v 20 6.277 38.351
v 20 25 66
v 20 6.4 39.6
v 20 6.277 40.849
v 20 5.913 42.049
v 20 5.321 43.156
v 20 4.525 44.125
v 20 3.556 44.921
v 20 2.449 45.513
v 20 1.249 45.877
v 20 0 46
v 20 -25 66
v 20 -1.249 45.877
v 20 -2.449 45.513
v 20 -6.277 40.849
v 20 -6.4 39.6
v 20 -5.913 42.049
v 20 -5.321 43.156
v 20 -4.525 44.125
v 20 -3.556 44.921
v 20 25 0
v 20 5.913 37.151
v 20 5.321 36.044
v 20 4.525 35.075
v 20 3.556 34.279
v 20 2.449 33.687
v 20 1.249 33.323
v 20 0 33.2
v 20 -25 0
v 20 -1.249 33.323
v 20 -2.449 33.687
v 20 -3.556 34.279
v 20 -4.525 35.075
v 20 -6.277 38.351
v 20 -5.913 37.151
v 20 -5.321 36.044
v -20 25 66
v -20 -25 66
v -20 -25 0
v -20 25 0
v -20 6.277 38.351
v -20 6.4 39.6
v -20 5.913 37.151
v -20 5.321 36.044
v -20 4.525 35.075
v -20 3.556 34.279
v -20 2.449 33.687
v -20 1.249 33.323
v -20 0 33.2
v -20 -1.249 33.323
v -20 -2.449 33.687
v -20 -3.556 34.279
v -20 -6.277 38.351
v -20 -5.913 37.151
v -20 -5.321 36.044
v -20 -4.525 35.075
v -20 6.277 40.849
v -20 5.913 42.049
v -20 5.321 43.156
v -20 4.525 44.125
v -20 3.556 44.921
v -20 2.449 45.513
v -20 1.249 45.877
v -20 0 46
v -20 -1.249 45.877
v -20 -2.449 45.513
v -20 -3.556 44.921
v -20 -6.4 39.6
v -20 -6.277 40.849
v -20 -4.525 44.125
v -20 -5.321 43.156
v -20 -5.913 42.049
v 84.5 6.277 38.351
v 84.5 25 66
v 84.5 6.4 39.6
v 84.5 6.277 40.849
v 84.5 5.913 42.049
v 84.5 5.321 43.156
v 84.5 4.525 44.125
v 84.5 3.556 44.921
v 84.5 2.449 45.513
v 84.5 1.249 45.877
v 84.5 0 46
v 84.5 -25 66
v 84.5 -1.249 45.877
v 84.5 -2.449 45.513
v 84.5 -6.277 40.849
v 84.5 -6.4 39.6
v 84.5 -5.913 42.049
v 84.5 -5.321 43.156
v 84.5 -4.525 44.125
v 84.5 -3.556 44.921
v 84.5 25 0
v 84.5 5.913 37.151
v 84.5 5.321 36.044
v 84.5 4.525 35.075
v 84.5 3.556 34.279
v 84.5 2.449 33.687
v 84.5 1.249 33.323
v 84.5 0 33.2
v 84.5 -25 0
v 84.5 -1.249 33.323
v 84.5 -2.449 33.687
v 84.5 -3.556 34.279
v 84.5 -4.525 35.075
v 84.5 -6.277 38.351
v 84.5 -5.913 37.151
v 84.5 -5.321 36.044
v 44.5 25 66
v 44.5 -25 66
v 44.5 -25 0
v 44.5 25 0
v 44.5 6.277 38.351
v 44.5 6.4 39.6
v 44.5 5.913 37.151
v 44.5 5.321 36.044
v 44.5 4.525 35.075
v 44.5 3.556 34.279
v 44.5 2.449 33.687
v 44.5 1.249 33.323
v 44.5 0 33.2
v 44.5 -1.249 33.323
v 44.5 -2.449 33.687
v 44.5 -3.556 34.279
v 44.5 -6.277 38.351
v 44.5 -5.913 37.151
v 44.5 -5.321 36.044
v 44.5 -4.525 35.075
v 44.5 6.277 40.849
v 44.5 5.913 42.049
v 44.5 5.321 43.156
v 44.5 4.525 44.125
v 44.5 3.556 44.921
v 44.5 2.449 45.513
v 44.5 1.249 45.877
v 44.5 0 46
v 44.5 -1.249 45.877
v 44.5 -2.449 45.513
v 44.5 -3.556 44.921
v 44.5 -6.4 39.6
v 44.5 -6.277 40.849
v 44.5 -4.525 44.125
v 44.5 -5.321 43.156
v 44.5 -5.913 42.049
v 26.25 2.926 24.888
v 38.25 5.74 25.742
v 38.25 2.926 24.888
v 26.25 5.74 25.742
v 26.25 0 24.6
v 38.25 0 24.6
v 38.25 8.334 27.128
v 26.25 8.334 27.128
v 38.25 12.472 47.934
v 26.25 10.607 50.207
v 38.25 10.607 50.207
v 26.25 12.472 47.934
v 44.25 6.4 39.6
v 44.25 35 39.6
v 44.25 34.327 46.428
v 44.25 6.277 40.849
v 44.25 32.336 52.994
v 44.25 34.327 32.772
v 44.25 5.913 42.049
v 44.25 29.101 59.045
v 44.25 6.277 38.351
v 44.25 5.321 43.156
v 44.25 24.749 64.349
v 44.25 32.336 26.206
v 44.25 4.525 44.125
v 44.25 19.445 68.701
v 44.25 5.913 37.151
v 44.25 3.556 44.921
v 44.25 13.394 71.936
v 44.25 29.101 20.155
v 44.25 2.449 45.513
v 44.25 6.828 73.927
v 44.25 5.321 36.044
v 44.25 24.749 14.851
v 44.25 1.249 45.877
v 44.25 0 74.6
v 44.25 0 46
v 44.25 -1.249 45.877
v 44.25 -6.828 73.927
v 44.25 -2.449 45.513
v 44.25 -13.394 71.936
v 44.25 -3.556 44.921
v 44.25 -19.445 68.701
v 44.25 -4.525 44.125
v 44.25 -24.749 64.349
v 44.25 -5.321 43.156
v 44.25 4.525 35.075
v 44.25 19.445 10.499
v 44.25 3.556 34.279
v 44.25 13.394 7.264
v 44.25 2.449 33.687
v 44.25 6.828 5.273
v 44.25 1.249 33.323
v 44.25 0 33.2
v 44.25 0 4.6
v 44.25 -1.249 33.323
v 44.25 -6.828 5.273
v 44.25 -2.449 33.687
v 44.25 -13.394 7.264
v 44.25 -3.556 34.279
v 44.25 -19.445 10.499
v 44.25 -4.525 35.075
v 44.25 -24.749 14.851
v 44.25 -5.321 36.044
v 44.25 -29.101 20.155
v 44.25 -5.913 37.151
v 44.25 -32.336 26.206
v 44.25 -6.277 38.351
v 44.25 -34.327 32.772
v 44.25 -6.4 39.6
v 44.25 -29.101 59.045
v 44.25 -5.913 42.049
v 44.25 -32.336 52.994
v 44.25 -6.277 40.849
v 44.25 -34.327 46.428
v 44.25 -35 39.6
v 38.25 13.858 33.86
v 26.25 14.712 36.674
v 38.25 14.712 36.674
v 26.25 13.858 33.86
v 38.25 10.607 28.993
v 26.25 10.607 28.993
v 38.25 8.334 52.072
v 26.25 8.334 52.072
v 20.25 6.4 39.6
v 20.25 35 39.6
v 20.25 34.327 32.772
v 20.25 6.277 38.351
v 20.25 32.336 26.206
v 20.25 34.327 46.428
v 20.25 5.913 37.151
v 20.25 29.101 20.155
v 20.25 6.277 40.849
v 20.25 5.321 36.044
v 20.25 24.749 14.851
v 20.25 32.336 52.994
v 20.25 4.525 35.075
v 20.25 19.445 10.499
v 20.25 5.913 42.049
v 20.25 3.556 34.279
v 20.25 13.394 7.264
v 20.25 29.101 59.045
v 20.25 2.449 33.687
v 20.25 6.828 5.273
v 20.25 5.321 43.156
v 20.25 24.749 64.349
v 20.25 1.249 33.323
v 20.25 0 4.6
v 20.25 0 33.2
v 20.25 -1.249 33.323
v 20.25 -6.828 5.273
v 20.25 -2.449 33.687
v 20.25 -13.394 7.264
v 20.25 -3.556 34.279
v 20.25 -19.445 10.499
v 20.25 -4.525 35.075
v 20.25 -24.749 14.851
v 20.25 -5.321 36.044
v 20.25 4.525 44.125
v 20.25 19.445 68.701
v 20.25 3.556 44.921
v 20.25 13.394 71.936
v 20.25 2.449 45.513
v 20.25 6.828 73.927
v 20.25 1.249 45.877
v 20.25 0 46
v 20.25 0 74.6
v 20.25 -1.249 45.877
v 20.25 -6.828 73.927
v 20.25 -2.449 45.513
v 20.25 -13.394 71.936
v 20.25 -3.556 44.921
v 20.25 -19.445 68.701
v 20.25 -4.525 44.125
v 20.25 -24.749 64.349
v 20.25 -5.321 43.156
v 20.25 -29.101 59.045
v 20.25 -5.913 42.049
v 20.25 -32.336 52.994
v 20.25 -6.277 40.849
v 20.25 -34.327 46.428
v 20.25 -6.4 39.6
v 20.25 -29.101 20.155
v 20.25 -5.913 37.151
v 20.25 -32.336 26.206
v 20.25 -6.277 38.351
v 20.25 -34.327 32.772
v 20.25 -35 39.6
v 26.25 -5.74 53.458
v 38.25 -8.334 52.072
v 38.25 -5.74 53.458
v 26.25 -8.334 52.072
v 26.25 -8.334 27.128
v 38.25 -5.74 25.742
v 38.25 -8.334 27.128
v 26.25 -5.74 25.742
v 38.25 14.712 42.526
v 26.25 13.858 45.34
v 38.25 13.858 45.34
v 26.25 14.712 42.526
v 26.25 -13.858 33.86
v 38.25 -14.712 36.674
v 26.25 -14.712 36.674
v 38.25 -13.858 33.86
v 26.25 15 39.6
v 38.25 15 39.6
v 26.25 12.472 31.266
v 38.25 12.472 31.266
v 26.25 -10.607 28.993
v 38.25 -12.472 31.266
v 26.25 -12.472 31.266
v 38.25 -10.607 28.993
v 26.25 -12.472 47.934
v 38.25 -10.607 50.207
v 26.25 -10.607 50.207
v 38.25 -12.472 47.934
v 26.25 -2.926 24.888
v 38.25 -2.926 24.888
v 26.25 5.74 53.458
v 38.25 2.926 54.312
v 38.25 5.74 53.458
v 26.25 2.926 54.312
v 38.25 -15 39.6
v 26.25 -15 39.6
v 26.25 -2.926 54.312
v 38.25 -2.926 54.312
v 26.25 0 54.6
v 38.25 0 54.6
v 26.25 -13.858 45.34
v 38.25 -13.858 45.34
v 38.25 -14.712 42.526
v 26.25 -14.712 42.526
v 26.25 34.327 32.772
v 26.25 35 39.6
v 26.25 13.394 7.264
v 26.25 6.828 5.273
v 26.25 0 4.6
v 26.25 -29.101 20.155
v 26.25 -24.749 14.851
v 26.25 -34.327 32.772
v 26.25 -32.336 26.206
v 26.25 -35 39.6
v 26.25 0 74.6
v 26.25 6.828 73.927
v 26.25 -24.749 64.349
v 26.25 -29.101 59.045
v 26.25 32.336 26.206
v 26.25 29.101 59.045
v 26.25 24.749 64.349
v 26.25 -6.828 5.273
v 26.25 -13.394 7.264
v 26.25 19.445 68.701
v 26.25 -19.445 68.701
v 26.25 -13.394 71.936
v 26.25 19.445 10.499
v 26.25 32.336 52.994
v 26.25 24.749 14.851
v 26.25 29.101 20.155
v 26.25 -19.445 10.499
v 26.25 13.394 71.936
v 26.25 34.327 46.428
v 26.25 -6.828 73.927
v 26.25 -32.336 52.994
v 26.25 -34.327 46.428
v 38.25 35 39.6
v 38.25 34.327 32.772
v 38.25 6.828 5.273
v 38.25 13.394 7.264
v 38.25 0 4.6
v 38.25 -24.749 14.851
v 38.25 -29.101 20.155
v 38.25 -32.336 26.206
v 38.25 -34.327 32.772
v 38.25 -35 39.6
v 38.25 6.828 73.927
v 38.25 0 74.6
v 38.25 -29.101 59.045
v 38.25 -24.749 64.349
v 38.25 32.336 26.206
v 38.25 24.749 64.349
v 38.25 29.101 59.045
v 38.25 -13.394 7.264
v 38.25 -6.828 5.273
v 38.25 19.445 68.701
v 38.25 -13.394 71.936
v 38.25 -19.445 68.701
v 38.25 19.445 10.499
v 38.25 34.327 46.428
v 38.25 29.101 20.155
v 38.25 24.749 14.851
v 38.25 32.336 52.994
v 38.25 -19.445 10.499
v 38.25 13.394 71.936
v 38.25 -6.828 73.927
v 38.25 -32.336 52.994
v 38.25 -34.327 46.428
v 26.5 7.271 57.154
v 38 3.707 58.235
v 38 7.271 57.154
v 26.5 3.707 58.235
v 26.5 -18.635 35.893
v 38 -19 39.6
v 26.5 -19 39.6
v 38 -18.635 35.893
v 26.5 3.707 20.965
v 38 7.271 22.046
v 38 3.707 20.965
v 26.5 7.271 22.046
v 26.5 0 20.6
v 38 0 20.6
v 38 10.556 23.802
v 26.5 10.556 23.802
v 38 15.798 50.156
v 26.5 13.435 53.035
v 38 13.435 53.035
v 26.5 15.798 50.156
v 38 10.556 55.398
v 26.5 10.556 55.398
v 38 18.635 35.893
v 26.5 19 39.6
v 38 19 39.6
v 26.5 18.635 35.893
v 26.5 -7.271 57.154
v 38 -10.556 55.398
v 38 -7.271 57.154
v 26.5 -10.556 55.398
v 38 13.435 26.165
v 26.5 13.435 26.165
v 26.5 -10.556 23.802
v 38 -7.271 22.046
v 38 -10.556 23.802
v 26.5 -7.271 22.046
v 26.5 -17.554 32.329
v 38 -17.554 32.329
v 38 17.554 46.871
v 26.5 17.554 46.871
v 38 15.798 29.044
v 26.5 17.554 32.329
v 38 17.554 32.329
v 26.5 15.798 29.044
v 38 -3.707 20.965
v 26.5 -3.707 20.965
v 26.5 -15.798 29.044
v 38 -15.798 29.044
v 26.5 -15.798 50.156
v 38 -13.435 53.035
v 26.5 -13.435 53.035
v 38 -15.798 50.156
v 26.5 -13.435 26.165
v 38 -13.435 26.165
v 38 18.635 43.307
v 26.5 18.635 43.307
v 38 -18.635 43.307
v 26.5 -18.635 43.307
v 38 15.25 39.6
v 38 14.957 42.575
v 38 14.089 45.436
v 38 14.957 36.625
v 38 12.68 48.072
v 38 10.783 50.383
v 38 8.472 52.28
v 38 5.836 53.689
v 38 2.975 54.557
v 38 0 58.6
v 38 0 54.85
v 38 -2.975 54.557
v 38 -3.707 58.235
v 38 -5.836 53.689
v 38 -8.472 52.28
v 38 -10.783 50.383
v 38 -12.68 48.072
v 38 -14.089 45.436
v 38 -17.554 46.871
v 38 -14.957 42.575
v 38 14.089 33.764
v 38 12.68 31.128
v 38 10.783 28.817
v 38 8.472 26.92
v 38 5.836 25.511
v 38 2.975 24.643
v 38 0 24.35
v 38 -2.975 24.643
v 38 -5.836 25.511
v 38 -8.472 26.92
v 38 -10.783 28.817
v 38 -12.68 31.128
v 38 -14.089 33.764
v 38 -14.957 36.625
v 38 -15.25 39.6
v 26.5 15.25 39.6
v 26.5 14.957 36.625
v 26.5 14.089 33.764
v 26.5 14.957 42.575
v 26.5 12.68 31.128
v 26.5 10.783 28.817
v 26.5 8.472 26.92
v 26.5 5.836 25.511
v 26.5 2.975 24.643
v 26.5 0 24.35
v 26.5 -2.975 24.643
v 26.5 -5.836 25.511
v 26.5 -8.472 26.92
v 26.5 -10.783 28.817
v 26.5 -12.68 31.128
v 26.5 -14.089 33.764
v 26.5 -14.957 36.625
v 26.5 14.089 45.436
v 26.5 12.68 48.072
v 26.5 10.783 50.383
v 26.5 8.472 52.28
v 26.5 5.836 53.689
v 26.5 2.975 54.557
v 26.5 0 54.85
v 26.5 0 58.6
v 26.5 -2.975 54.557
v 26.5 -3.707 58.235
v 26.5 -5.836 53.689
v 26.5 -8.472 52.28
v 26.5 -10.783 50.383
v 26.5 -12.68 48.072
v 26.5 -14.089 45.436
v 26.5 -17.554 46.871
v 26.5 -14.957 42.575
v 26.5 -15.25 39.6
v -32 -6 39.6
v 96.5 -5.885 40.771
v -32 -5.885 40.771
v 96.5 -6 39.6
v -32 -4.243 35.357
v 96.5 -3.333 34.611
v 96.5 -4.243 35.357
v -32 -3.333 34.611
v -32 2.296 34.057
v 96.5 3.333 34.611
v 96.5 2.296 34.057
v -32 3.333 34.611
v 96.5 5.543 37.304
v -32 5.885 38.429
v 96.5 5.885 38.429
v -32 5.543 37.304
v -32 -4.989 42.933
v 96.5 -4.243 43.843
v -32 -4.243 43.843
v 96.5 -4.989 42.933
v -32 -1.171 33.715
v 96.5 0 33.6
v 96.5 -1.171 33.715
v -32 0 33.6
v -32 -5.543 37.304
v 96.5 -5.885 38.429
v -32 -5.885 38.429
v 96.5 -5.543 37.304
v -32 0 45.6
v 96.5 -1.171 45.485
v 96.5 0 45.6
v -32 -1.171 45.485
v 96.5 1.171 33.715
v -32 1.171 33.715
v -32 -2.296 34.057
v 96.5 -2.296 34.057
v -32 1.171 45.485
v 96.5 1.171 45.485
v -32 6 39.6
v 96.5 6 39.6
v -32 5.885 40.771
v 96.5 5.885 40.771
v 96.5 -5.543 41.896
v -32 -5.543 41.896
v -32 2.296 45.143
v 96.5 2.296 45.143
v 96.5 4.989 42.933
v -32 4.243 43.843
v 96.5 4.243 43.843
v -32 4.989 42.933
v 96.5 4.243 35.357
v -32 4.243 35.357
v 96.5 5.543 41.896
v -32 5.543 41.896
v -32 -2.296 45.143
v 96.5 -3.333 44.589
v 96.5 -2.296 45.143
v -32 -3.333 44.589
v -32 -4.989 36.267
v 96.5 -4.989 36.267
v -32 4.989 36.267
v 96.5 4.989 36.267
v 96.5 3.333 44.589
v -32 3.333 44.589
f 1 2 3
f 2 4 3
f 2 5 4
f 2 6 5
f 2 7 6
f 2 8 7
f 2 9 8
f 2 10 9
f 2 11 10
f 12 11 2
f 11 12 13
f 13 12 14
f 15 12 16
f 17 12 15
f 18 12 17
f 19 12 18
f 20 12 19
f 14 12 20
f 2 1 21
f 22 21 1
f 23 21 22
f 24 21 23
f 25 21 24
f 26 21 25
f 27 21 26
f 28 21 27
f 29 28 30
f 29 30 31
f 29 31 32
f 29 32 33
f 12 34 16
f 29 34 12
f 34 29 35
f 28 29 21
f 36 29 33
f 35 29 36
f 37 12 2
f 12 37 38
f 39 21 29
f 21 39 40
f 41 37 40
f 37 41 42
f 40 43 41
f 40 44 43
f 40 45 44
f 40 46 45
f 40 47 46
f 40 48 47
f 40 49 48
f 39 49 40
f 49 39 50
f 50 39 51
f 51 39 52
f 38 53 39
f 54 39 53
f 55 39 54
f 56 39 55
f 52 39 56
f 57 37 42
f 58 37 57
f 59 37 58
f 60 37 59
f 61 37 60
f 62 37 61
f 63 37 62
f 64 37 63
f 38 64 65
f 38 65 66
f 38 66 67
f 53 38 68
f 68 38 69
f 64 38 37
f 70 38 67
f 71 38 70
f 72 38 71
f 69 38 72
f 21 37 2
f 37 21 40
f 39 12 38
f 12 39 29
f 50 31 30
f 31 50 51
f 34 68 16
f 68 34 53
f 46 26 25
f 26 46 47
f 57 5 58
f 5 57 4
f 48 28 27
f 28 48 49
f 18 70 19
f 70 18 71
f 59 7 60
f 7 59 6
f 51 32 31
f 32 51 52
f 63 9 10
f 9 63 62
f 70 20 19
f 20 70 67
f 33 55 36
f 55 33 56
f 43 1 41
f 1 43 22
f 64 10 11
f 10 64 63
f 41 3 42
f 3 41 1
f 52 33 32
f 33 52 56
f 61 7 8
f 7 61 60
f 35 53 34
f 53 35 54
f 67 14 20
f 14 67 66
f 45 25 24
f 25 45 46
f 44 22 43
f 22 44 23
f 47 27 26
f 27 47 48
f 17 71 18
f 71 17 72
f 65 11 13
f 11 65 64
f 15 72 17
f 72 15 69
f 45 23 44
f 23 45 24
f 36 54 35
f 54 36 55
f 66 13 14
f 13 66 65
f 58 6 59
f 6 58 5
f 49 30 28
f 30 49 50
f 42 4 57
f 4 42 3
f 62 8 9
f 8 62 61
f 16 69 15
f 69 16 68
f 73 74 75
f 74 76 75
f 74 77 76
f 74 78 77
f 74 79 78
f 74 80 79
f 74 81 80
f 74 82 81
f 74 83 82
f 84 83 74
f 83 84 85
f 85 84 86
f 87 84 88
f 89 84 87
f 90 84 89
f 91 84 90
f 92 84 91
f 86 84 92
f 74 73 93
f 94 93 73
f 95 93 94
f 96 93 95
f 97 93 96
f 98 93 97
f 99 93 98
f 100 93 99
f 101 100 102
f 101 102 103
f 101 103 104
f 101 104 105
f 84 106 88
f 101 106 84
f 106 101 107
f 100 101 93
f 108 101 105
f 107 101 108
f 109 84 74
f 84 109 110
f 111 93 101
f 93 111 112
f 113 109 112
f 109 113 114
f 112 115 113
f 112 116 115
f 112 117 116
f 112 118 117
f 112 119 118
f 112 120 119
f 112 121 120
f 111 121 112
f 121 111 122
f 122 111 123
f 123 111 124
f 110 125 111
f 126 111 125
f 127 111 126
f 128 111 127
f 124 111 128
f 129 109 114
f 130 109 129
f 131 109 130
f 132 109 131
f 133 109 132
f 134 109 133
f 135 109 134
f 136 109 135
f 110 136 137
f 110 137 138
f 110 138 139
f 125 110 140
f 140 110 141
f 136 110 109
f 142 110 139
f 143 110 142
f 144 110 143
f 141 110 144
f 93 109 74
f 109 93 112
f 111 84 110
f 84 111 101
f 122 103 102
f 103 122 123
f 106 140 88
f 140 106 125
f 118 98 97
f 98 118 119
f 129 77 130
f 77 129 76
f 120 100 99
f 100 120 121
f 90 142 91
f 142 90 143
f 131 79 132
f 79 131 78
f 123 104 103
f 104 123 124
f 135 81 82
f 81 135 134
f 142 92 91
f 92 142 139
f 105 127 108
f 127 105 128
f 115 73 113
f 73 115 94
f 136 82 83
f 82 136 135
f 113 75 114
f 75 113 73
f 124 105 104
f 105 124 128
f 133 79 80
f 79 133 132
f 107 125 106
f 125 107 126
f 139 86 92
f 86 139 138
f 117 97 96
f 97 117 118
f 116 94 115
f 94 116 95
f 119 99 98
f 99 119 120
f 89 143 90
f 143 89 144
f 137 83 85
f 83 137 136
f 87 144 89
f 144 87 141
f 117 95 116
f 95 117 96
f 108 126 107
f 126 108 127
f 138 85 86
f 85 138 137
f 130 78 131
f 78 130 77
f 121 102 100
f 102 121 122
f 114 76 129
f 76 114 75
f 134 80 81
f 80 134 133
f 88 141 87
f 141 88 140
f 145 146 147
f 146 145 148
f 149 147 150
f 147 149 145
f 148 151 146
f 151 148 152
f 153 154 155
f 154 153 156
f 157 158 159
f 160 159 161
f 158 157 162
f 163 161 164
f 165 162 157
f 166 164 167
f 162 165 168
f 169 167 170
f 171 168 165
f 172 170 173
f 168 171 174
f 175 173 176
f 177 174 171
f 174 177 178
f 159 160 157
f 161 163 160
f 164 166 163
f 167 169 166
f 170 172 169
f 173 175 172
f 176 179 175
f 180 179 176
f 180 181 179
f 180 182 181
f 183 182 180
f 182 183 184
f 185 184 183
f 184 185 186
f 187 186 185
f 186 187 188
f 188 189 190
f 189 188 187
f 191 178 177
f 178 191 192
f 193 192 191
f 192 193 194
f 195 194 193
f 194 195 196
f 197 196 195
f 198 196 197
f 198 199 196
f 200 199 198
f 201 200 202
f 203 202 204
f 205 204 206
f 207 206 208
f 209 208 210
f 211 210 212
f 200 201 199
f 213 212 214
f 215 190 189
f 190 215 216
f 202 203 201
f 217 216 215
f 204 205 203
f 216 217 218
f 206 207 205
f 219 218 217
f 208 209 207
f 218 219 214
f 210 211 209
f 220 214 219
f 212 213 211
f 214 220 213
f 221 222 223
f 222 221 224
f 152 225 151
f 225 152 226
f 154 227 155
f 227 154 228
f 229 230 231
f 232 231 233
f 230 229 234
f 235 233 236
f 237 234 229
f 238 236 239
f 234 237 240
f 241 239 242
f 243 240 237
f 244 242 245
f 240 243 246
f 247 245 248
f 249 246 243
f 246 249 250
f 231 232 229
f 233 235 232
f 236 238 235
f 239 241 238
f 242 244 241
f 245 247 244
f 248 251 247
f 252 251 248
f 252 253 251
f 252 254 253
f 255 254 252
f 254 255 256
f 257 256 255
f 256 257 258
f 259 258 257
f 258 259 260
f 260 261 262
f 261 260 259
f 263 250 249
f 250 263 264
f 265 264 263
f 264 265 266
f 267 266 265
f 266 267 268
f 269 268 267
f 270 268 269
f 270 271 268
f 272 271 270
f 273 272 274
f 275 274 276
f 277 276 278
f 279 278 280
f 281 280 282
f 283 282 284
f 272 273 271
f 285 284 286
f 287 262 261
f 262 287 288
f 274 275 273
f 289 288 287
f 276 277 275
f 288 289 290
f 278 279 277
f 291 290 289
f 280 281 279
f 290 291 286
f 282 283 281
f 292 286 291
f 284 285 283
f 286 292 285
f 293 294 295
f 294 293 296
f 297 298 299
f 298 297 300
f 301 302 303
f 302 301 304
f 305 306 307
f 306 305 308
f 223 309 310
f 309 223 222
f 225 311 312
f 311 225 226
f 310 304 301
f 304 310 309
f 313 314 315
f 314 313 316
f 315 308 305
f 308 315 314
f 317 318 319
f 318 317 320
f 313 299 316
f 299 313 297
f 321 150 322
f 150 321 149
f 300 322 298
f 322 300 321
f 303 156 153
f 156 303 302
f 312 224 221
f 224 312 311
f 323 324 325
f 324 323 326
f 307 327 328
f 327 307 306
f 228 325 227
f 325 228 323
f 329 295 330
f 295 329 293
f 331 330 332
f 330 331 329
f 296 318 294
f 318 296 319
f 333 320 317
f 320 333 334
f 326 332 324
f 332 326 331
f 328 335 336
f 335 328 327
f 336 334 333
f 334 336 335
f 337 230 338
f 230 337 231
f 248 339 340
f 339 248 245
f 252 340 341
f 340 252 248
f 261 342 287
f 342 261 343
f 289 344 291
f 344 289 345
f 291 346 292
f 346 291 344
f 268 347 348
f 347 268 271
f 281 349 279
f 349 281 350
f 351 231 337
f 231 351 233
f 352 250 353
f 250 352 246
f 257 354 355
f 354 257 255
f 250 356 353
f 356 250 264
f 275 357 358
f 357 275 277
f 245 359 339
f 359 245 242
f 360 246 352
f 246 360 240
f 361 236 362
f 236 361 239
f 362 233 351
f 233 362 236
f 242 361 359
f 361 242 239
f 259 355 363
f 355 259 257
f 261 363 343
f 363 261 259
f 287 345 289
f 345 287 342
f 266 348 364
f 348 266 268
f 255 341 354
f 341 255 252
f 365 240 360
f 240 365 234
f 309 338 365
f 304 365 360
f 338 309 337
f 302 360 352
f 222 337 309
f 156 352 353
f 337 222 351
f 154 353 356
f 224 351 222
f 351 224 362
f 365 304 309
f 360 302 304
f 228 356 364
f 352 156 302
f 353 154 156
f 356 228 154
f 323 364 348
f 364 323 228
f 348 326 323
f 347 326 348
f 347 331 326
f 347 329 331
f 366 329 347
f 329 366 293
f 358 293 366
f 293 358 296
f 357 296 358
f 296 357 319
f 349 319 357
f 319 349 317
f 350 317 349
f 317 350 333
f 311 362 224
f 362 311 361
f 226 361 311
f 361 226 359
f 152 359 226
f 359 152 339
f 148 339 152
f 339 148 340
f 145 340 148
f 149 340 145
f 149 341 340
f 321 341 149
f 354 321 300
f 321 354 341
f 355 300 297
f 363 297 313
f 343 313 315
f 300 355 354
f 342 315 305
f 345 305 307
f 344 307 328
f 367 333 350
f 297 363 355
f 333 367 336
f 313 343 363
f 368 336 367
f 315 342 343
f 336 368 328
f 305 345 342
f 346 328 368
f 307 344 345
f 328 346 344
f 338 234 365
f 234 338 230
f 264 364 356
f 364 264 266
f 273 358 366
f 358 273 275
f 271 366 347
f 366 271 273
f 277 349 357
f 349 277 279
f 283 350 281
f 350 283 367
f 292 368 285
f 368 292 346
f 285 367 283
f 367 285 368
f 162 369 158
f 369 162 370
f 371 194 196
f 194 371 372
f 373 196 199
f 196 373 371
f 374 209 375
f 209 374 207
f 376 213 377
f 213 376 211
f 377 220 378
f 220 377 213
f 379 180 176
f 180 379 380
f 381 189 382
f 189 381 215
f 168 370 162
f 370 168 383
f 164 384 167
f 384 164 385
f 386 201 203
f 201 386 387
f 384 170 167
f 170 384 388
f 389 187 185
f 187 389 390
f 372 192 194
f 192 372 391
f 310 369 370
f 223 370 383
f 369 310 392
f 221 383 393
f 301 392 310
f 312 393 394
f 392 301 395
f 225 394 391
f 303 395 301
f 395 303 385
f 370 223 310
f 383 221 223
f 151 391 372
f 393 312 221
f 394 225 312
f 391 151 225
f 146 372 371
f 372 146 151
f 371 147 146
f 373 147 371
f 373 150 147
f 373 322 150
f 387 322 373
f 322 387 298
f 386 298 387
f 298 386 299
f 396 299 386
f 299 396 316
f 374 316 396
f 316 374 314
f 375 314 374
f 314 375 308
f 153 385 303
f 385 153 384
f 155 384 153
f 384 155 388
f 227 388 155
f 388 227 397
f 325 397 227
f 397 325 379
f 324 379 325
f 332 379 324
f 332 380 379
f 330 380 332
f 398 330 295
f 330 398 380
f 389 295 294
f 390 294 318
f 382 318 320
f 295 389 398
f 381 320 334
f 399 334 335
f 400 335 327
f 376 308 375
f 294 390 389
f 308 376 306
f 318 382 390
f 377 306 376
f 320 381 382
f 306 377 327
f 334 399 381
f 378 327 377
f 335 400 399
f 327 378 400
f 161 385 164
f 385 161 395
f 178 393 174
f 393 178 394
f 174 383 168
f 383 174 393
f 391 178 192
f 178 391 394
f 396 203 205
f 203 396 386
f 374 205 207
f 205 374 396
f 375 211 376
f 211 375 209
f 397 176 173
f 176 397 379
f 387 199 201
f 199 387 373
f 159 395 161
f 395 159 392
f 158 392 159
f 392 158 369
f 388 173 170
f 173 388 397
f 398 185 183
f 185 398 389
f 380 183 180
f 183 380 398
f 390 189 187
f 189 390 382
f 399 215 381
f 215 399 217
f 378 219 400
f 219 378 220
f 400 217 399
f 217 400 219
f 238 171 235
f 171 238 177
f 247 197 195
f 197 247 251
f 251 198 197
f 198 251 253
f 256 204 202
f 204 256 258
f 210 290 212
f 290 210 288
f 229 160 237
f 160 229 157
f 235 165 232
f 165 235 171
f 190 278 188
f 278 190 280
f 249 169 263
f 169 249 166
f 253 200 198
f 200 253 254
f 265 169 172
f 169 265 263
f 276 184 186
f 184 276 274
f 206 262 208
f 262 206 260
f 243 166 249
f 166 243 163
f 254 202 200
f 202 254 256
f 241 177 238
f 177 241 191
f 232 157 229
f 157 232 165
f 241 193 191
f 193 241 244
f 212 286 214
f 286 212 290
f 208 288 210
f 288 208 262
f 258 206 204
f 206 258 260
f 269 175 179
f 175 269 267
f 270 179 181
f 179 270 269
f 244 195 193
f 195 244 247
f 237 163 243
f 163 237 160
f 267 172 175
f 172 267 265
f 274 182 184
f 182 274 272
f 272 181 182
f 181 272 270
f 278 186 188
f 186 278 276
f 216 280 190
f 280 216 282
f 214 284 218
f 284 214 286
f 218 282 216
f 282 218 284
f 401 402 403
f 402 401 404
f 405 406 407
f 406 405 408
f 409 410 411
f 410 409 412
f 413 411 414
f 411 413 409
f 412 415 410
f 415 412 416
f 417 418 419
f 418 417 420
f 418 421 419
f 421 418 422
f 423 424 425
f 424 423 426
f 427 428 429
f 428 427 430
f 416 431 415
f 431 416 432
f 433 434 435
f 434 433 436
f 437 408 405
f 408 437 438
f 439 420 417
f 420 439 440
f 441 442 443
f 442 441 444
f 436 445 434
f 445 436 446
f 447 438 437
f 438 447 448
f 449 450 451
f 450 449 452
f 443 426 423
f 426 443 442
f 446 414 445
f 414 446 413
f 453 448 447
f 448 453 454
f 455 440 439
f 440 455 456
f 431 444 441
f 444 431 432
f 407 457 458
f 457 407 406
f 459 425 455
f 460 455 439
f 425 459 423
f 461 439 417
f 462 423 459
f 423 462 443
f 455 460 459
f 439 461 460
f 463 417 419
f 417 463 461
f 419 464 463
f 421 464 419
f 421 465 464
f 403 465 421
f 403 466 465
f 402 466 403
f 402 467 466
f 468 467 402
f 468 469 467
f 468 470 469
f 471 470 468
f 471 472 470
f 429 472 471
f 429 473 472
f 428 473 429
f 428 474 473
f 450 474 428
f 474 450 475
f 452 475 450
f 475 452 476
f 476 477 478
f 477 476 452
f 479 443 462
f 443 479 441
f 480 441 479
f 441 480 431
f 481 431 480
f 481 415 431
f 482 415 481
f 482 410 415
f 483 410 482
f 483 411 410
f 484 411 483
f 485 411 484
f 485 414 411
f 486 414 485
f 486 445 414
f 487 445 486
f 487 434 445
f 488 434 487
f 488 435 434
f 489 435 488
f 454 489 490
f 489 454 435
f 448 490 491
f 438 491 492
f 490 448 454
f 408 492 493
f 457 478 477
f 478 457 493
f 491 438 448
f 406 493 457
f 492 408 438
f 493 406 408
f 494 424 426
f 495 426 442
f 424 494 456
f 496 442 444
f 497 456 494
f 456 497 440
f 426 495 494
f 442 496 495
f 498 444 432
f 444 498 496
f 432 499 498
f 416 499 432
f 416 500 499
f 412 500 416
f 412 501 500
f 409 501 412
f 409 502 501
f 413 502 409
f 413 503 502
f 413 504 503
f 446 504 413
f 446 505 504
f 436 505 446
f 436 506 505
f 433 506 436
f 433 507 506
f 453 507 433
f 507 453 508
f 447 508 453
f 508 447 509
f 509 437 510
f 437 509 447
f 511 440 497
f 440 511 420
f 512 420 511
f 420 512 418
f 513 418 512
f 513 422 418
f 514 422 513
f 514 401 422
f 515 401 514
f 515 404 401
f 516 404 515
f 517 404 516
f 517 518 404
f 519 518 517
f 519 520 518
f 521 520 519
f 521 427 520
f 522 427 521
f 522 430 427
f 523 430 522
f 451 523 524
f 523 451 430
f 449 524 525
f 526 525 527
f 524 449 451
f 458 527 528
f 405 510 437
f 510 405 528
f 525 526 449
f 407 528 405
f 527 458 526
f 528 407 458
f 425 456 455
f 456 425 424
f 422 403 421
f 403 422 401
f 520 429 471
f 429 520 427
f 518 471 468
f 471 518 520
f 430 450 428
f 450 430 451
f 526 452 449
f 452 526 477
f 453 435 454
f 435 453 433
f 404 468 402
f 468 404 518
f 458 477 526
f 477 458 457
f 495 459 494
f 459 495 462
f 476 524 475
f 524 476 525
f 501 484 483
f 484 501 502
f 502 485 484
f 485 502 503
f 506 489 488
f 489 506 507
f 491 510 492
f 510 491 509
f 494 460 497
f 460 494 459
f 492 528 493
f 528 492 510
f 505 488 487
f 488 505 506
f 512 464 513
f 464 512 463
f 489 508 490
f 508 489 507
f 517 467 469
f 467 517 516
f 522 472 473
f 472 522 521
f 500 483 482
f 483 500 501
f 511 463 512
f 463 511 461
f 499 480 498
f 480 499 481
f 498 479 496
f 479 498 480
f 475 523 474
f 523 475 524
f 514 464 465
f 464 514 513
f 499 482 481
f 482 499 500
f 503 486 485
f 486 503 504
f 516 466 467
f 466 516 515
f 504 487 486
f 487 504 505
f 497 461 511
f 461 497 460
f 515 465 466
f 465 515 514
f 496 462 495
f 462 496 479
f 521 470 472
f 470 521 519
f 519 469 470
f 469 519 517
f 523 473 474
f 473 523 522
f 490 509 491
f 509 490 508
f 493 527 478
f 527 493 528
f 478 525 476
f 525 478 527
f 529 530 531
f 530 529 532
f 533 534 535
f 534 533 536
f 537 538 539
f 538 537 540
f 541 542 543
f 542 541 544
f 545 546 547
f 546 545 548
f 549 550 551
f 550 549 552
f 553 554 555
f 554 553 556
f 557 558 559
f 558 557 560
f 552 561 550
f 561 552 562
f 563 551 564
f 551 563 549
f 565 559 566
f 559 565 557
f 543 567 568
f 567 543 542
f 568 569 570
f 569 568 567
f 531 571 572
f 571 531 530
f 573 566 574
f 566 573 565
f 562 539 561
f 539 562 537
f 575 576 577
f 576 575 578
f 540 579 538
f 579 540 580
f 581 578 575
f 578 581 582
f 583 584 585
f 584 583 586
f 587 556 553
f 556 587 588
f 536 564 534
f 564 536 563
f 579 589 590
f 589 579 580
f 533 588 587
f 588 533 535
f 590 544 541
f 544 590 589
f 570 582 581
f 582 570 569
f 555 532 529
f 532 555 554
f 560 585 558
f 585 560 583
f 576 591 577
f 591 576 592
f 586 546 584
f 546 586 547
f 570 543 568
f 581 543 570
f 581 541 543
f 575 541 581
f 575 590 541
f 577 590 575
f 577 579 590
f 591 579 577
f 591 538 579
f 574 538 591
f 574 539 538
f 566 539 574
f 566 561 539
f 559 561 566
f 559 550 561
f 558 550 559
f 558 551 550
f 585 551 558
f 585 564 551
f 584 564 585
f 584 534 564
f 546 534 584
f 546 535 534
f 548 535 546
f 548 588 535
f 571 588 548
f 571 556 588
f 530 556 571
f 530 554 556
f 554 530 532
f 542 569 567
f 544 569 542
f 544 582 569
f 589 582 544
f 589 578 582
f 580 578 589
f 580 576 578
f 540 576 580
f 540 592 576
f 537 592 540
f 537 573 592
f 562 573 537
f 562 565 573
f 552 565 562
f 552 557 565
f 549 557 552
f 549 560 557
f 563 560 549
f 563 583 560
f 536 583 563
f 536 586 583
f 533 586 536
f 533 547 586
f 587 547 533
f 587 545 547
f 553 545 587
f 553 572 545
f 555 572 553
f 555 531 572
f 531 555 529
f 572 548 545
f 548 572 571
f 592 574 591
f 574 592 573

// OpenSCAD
$fn = 32;

// ------------------------------------------------------------------------
// Pulley assembly: d70 pulley with a belt, shaft d12
// Every part is its own module, assembly() places them once.
// ------------------------------------------------------------------------

// --- part 1 ---
module support1() {
  difference() {
    translate([-20, -25, 0]) cube([40, 50, 66]);
    translate([0, 0, 39.6]) rotate([0, 90, 0]) cylinder(h = 42, d = 12.8, center = true);
  }
}

// --- part 2 ---
module support2() {
  difference() {
    translate([-20, -25, 0]) cube([40, 50, 66]);
    translate([0, 0, 39.6]) rotate([0, 90, 0]) cylinder(h = 42, d = 12.8, center = true);
  }
}

// --- part 3 ---
module shaft() {
  translate([0, 0, -64.25]) cylinder(h = 128.5, d = 12);
}

// --- part 4 ---
module pulley() {
  difference() {
    union() {
      cylinder(h = 24, d = 30);
      cylinder(h = 6, d = 70);
      translate([0, 0, 18]) cylinder(h = 6, d = 70);
    }
    translate([0, 0, -1]) cylinder(h = 26, d = 12.8);
  }
}

// --- part 5 ---
module belt() {
  difference() {
      translate([0, 0, 0]) cylinder(h = 11.5, d = 38);
      translate([0, 0, -1]) cylinder(h = 13.5, d = 30.5);
    }
}

// --- assembly ---
module assembly() {
  translate([0, 0, 0]) rotate([0, 0, 0]) support1();
  translate([64.5, 0, 0]) rotate([0, 0, 0]) support2();
  translate([32.25, 0, 39.6]) rotate([0, 90, 0]) shaft();
  translate([20.25, 0, 39.6]) rotate([0, 90, 0]) pulley();
  translate([26.5, 0, 39.6]) rotate([0, 90, 0]) belt();
}

assembly();
